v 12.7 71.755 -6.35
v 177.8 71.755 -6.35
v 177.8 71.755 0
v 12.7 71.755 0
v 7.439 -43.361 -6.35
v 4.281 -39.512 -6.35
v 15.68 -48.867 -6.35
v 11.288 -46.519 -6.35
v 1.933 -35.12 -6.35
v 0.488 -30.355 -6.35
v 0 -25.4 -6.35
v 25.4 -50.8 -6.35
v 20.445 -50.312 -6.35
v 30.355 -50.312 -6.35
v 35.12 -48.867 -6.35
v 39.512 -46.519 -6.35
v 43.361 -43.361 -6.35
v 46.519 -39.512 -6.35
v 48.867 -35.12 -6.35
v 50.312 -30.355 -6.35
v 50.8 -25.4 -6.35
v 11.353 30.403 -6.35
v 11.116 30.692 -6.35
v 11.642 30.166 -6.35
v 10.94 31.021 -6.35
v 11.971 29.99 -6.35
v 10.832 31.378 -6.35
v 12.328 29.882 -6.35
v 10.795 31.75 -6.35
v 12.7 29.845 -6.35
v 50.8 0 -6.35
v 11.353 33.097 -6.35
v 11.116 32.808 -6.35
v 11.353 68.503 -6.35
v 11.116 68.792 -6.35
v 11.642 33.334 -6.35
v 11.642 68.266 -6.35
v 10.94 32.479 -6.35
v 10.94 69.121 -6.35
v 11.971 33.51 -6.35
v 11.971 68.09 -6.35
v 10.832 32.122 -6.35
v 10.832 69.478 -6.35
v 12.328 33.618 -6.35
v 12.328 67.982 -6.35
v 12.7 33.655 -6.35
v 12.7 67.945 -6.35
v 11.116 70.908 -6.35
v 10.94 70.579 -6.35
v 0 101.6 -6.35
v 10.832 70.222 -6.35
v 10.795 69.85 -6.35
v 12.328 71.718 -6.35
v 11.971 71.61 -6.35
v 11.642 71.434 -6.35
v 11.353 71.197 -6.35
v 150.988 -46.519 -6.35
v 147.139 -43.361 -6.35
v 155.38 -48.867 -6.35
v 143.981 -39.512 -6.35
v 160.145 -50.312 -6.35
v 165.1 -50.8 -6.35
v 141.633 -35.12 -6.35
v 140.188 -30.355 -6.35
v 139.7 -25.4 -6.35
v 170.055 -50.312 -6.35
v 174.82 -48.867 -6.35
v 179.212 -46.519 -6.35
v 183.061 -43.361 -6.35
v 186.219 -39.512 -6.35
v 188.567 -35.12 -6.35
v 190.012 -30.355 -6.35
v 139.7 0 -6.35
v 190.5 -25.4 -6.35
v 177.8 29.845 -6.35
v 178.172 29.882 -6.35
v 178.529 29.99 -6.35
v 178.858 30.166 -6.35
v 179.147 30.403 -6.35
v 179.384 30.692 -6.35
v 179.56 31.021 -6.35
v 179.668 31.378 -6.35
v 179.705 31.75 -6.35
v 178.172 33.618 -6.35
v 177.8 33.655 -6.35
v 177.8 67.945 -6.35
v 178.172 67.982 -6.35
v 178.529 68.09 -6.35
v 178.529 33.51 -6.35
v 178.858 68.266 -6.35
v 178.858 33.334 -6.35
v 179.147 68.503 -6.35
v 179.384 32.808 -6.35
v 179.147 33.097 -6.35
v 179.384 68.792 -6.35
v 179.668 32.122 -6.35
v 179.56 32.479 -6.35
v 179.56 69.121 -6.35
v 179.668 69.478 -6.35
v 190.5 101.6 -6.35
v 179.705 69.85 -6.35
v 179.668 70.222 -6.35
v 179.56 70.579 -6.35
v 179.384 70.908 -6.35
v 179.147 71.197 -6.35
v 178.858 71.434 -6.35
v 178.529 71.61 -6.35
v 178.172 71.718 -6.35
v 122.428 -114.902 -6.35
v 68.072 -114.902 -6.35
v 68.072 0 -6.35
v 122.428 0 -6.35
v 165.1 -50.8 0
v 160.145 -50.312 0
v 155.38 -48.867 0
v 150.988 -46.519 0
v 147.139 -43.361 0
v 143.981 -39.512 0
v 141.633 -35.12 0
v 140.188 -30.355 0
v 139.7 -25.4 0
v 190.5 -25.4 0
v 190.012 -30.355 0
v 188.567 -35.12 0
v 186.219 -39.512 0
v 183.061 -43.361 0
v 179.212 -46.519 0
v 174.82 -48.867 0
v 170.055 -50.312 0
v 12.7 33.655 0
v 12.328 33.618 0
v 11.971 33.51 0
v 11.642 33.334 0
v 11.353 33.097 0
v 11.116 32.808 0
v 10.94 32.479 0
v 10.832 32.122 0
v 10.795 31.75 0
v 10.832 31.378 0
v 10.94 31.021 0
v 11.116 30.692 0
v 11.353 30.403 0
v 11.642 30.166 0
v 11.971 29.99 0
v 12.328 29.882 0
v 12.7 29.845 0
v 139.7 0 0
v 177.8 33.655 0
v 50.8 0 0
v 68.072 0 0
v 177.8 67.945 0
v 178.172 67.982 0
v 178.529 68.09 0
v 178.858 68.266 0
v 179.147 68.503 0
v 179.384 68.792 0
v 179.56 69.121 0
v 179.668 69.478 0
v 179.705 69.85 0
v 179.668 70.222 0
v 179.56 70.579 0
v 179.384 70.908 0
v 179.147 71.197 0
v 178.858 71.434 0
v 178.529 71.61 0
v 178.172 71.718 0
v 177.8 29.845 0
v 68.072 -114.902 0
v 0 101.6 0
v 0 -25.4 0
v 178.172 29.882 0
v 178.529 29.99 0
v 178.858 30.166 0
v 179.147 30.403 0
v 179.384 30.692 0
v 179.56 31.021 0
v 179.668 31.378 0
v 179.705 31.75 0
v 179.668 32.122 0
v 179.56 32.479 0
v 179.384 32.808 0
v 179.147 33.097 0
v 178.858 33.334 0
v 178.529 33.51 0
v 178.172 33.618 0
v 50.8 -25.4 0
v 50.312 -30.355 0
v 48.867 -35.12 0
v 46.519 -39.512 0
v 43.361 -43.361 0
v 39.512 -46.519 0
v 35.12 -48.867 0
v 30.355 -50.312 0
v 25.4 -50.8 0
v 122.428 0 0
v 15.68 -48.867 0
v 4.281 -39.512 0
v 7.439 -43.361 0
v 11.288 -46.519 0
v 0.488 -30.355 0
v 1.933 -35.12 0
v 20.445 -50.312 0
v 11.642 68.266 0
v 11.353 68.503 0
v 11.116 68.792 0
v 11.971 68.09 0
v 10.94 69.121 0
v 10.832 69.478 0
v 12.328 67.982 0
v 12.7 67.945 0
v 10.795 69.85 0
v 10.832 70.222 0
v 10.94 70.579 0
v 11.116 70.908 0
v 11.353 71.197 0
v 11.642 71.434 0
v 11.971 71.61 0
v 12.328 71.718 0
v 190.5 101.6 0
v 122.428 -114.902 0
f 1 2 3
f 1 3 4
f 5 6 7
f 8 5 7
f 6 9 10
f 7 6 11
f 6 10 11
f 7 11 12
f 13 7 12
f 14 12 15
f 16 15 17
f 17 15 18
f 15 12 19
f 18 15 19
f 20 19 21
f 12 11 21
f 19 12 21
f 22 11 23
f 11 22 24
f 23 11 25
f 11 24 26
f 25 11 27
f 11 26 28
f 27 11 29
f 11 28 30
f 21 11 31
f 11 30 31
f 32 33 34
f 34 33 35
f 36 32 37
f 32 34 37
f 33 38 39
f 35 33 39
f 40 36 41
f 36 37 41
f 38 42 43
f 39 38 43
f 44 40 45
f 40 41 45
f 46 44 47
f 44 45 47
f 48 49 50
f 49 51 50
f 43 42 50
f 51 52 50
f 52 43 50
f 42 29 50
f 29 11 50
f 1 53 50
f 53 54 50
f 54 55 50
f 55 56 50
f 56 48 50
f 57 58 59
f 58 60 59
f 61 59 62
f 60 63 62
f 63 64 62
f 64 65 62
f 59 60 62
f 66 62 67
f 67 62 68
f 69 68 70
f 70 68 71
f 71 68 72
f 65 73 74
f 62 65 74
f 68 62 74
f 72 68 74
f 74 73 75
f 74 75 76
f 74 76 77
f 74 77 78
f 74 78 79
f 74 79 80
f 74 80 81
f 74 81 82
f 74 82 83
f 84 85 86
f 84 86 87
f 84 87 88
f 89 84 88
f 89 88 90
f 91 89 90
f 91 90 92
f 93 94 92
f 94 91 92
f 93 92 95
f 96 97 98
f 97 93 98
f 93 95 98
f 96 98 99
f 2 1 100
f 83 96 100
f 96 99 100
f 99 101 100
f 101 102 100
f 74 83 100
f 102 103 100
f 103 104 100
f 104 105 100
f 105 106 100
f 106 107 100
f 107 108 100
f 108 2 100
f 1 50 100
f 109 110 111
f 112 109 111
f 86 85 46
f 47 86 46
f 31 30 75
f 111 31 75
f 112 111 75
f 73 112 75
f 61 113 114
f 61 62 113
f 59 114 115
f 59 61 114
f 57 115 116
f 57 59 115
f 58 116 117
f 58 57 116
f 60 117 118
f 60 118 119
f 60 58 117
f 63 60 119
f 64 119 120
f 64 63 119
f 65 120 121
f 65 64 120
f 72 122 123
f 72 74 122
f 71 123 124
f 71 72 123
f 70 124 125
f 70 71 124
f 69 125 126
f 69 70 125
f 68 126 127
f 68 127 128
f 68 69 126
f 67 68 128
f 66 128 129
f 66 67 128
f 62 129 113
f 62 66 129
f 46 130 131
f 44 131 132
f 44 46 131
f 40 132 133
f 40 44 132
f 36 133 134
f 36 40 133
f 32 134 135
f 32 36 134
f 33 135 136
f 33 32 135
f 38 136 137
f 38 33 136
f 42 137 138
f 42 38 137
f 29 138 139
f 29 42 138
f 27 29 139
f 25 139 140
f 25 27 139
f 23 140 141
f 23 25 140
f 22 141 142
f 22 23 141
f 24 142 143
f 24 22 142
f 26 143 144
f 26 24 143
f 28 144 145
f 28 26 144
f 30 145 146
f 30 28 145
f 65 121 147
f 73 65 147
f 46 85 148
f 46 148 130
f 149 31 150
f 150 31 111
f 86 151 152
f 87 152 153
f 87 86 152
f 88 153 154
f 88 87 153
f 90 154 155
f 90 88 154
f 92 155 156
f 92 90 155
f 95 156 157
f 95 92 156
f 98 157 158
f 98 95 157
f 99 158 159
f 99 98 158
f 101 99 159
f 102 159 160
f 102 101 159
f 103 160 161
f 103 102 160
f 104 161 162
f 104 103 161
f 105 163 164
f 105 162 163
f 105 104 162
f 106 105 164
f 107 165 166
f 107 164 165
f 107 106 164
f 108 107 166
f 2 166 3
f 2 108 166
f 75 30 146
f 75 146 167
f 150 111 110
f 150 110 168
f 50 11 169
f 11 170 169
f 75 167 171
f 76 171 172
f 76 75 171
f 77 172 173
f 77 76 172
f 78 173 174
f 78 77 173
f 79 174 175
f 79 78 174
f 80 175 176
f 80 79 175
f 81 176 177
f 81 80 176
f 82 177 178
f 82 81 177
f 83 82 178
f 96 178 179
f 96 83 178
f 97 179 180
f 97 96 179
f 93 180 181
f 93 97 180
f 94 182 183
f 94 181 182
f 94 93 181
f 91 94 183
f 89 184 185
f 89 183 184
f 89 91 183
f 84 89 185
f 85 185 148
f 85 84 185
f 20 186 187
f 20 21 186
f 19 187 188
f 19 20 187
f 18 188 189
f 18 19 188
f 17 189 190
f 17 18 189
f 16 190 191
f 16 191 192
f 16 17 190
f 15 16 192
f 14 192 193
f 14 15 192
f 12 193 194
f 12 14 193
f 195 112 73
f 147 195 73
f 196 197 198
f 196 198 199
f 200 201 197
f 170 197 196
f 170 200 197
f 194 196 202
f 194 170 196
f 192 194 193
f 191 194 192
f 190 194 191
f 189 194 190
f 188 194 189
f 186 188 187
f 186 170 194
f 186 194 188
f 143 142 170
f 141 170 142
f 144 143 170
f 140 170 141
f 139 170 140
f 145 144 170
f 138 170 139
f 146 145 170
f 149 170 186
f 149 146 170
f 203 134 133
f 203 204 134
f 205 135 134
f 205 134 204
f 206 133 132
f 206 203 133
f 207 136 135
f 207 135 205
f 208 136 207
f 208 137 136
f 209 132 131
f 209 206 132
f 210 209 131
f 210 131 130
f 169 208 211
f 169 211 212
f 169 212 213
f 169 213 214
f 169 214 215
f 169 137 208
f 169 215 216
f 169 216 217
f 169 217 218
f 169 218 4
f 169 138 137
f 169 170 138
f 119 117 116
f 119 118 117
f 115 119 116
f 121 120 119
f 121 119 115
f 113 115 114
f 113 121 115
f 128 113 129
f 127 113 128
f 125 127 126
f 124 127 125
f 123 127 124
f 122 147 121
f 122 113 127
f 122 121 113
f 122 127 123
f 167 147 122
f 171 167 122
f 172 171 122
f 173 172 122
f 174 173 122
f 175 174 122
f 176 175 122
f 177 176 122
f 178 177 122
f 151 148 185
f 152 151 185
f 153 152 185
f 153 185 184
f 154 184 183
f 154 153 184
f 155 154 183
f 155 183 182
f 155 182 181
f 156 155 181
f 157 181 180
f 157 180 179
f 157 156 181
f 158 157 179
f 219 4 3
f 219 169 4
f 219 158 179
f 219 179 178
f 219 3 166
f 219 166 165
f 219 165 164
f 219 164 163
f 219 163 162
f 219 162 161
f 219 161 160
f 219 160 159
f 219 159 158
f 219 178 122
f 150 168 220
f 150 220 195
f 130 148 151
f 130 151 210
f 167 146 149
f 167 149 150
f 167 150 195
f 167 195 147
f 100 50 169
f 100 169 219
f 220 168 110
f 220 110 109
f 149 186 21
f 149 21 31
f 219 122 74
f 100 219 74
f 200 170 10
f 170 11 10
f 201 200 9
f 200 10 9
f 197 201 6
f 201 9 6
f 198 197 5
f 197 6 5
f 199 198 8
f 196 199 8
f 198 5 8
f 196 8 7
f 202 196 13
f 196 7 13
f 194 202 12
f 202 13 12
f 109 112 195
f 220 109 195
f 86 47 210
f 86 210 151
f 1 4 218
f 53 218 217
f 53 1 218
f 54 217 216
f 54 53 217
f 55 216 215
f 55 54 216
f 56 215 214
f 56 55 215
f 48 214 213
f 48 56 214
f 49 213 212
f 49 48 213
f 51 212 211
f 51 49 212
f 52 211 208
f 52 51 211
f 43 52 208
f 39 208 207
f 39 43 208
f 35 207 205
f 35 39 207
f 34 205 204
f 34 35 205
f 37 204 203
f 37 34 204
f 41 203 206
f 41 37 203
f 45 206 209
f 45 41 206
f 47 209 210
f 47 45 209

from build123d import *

# Parameters (mm, degrees)
SKETCH1_W           = 190.5
SKETCH1_H           = 6.35
BOSS_EXTRUDE1_DEPTH = 101.6
CUT_EXTRUDE1_DEPTH  = 216.993362167
SKETCH3_W           = 50.8
SKETCH3_H           = 50.8
BOSS_EXTRUDE2_DEPTH = 6.35
FILLET1_R           = 25.4
SKETCH4_W           = 54.356
SKETCH4_H           = 6.35
BOSS_EXTRUDE3_DEPTH = 114.9016


with BuildPart() as part:
    # Sketch1 → Boss-Extrude1 (new body)
    with BuildSketch(Plane(origin=(0, 0, 0), x_dir=(1, 0, 0), z_dir=(0, 1, 0))):
        with Locations((95.25, 3.175)):
            Rectangle(SKETCH1_W, SKETCH1_H)
    extrude(amount=BOSS_EXTRUDE1_DEPTH)

    # Sketch2 → Cut-Extrude1 (cut, through all)
    with BuildSketch(Plane(origin=(0, 0, -6.35), x_dir=(-1, 0, 0), z_dir=(0, 0, -1))):
        with BuildLine():
            Line((-177.8, 71.755), (-12.7, 71.755))
            ThreePointArc((-12.7, 71.755), (-10.795, 69.85), (-12.7, 67.945))
            Line((-12.7, 67.945), (-177.8, 67.945))
            ThreePointArc((-177.8, 67.945), (-179.705, 69.85), (-177.8, 71.755))
        make_face()
        with BuildLine():
            Line((-177.8, 33.655), (-12.7, 33.655))
            ThreePointArc((-12.7, 33.655), (-10.795, 31.75), (-12.7, 29.845))
            Line((-12.7, 29.845), (-177.8, 29.845))
            ThreePointArc((-177.8, 29.845), (-179.705, 31.75), (-177.8, 33.655))
        make_face()
    extrude(amount=-CUT_EXTRUDE1_DEPTH, mode=Mode.SUBTRACT)

    # Sketch3 → Boss-Extrude2 (add)
    with BuildSketch(Plane.XY):
        with Locations((25.4, -25.4)):
            Rectangle(SKETCH3_W, SKETCH3_H)
        with Locations((165.1, -25.4)):
            Rectangle(SKETCH3_W, SKETCH3_H)
    extrude(amount=-BOSS_EXTRUDE2_DEPTH)

    # Fillet1
    fillet1_edges = [part.edges().sort_by_distance(p)[0] for p in [
        (139.7, -50.8, -3.175),
        (0, -50.8, -3.175),
        (50.8, -50.8, -3.175),
        (190.5, -50.8, -3.175),
    ]]
    fillet(fillet1_edges, radius=FILLET1_R - 0.0001)  # a hair under: the kernel refuses the full size

    # Sketch4 → Boss-Extrude3 (add)
    with BuildSketch(Plane.XZ):
        with Locations((95.25, -3.175)):
            Rectangle(SKETCH4_W, SKETCH4_H)
    extrude(amount=BOSS_EXTRUDE3_DEPTH)


solid = part.part
